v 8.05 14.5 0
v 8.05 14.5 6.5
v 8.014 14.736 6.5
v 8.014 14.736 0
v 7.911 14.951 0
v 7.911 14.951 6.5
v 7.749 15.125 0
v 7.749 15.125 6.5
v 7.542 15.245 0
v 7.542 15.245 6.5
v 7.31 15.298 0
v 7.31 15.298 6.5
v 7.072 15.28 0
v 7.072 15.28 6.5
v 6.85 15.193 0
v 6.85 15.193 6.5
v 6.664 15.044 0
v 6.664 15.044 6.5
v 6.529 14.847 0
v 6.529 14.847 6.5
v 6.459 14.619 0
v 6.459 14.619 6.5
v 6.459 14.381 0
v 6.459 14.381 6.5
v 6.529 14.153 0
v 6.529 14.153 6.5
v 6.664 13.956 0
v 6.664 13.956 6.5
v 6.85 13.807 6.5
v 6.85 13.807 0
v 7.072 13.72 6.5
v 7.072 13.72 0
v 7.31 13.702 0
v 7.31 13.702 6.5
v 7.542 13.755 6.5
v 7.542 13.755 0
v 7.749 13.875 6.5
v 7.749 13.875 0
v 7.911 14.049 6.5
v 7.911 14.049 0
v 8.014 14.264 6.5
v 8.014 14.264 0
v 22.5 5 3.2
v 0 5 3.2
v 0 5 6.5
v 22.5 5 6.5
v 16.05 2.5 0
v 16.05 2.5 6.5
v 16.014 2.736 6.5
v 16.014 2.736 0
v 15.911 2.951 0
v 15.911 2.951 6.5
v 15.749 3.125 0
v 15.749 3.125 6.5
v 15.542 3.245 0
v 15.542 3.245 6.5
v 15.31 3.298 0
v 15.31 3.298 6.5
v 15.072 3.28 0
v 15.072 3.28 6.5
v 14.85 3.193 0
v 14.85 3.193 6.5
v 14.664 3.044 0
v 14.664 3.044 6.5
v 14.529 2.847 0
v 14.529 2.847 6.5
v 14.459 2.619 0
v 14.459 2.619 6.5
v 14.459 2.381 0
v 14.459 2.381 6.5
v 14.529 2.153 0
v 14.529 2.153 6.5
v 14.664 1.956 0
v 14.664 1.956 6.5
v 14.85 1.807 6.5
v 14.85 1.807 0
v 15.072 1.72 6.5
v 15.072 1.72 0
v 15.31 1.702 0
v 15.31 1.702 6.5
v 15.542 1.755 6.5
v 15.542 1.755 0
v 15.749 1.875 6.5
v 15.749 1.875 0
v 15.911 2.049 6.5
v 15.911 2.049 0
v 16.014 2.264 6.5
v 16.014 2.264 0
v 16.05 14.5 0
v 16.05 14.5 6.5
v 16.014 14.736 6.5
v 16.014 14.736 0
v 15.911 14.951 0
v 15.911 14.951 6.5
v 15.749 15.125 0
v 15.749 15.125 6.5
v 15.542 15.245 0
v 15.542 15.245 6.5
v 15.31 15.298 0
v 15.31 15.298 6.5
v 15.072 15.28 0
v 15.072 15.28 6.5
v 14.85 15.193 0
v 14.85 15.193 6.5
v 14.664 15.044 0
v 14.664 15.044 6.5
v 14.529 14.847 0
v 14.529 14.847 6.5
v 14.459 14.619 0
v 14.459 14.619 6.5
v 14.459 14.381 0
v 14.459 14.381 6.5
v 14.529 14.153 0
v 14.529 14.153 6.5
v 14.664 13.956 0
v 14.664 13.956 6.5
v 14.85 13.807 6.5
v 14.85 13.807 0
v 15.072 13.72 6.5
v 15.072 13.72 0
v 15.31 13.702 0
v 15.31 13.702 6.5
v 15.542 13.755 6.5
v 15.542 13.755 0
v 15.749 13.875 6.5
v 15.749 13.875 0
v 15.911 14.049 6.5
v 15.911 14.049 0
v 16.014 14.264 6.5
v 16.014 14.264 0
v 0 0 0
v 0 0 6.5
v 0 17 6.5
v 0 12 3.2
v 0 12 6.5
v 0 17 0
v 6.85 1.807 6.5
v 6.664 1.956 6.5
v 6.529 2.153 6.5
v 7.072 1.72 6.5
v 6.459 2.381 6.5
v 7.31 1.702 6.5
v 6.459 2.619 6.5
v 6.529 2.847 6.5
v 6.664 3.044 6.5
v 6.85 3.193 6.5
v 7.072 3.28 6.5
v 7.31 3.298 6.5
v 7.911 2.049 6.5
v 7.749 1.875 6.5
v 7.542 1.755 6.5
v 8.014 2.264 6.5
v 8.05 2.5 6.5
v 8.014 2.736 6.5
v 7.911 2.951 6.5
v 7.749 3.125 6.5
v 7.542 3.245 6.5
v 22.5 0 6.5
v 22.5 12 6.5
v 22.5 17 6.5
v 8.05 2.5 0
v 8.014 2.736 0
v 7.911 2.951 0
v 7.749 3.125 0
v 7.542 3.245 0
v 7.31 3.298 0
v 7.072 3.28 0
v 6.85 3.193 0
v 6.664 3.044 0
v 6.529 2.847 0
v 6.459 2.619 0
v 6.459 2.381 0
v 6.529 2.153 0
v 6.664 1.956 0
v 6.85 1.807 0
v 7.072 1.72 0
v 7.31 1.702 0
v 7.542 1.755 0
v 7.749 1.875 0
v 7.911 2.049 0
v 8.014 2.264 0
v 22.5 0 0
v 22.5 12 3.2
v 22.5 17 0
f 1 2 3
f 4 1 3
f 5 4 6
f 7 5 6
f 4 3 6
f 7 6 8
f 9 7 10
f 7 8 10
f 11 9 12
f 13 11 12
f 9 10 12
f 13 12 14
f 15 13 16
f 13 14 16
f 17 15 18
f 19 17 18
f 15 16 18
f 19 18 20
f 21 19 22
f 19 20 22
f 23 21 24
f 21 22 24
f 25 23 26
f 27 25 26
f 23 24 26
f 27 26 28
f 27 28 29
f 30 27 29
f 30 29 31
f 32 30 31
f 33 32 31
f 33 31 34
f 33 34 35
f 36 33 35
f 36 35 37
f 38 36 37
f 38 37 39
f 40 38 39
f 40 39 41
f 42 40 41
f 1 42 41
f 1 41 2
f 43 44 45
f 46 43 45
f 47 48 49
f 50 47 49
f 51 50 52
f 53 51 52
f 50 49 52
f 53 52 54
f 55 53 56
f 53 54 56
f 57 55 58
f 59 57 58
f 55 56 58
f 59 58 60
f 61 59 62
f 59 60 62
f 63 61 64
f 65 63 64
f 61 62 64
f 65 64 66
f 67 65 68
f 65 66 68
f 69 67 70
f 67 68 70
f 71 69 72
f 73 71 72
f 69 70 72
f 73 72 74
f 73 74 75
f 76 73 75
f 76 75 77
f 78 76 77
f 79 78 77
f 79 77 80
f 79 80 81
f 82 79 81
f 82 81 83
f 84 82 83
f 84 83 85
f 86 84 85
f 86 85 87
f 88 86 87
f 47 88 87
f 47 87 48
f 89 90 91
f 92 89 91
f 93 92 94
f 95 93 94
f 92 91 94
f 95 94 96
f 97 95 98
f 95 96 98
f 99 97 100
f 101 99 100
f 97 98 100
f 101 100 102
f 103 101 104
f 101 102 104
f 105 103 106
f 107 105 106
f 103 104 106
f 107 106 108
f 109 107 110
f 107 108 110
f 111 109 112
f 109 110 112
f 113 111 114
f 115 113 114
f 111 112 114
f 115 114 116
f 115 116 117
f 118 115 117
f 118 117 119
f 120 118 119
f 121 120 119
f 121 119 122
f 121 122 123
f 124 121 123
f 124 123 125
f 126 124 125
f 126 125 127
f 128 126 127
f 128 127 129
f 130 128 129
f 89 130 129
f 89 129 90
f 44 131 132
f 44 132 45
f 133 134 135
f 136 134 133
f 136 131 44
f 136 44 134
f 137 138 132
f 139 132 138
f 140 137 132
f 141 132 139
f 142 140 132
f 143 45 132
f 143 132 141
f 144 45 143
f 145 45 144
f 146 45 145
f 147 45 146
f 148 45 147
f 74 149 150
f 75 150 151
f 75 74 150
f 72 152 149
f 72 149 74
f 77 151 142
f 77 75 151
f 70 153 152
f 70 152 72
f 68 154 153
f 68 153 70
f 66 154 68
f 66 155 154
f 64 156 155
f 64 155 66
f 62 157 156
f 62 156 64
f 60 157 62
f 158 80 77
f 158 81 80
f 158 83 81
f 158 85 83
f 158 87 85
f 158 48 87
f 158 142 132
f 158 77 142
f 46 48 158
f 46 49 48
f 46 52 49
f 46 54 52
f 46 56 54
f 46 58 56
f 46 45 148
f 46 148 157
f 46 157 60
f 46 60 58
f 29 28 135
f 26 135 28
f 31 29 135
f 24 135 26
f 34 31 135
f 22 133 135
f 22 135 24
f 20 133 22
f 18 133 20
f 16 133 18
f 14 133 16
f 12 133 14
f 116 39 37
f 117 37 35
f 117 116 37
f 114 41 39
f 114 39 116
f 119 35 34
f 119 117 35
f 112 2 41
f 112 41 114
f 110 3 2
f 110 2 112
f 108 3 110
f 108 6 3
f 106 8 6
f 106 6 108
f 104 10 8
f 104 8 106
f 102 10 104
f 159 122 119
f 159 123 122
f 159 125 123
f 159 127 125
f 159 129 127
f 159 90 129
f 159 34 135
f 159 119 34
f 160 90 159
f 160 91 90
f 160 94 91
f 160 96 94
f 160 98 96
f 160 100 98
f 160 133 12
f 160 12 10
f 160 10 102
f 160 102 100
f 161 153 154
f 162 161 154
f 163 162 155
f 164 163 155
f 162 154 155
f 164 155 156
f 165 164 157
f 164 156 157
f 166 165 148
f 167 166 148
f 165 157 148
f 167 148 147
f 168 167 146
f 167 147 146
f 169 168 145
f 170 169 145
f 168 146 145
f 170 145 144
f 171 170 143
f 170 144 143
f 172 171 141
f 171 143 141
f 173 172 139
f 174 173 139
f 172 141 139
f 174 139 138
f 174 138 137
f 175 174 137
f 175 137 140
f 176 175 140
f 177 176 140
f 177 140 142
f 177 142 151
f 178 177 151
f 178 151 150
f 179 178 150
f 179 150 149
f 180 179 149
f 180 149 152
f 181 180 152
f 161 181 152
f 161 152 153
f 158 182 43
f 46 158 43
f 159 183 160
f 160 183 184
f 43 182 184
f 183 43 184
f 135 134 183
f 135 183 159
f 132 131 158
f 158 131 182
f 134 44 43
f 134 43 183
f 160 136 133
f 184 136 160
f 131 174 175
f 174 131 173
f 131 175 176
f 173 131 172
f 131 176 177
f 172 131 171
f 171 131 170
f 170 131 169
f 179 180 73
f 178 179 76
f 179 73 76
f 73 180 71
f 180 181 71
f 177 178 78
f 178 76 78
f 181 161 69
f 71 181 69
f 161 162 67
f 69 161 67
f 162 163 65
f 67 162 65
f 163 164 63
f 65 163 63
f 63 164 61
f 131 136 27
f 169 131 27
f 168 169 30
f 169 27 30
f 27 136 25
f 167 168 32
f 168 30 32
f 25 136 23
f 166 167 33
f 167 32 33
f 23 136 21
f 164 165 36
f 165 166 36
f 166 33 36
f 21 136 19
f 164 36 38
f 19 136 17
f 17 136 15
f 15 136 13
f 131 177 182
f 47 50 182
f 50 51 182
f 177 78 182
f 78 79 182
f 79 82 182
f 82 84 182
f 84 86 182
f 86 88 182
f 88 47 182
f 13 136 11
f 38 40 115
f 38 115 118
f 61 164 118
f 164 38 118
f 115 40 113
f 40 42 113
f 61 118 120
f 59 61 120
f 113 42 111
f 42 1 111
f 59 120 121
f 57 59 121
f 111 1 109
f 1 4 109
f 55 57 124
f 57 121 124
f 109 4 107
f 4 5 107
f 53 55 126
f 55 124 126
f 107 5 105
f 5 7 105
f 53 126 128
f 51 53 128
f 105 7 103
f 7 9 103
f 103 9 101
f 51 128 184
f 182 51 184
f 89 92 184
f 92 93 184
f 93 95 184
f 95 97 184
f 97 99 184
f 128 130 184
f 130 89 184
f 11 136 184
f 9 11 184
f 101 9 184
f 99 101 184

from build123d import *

# Parameters (mm, degrees)
SKETCH_1_W             = 22.5
SKETCH_1_H             = 17
EXTRUDE_1_DEPTH        = 6.5
SKETCH_2_W             = 3.3
SKETCH_2_H             = 7
CUT_EXTRUDE_1_DEPTH    = 23.5
HOLE_WIZARD_M2_1_D     = 1.6
HOLE_WIZARD_M2_1_DEPTH = 10.1
HOLE_WIZARD_M2_1_TIP   = 0.480688495


with BuildPart() as part:
    # 草图1 → 凸台-拉伸1 (new body)
    with BuildSketch(Plane.XY):
        with Locations((11.25, 8.5)):
            Rectangle(SKETCH_1_W, SKETCH_1_H)
    extrude(amount=EXTRUDE_1_DEPTH)

    # 草图2 → 切除-拉伸1 (cut, through all)
    with BuildSketch(Plane.ZY):
        with Locations((4.85, 8.5)):
            Rectangle(SKETCH_2_W, SKETCH_2_H)
    extrude(amount=-CUT_EXTRUDE_1_DEPTH, mode=Mode.SUBTRACT)

    # M2 螺纹孔1
    with Locations(Plane(origin=(0, 0, 0), x_dir=(-1, 0, 0), z_dir=(0, 0, -1))):
        with Locations((-15.25, 2.5), (-7.25, 2.5), (-15.25, 14.5), (-7.25, 14.5)):
            Hole(HOLE_WIZARD_M2_1_D / 2, depth=HOLE_WIZARD_M2_1_DEPTH)
            with Locations((0, 0, -(HOLE_WIZARD_M2_1_DEPTH + HOLE_WIZARD_M2_1_TIP / 2))):  # 118° drill point
                Cone(0, HOLE_WIZARD_M2_1_D / 2, HOLE_WIZARD_M2_1_TIP, mode=Mode.SUBTRACT)


solid = part.part
